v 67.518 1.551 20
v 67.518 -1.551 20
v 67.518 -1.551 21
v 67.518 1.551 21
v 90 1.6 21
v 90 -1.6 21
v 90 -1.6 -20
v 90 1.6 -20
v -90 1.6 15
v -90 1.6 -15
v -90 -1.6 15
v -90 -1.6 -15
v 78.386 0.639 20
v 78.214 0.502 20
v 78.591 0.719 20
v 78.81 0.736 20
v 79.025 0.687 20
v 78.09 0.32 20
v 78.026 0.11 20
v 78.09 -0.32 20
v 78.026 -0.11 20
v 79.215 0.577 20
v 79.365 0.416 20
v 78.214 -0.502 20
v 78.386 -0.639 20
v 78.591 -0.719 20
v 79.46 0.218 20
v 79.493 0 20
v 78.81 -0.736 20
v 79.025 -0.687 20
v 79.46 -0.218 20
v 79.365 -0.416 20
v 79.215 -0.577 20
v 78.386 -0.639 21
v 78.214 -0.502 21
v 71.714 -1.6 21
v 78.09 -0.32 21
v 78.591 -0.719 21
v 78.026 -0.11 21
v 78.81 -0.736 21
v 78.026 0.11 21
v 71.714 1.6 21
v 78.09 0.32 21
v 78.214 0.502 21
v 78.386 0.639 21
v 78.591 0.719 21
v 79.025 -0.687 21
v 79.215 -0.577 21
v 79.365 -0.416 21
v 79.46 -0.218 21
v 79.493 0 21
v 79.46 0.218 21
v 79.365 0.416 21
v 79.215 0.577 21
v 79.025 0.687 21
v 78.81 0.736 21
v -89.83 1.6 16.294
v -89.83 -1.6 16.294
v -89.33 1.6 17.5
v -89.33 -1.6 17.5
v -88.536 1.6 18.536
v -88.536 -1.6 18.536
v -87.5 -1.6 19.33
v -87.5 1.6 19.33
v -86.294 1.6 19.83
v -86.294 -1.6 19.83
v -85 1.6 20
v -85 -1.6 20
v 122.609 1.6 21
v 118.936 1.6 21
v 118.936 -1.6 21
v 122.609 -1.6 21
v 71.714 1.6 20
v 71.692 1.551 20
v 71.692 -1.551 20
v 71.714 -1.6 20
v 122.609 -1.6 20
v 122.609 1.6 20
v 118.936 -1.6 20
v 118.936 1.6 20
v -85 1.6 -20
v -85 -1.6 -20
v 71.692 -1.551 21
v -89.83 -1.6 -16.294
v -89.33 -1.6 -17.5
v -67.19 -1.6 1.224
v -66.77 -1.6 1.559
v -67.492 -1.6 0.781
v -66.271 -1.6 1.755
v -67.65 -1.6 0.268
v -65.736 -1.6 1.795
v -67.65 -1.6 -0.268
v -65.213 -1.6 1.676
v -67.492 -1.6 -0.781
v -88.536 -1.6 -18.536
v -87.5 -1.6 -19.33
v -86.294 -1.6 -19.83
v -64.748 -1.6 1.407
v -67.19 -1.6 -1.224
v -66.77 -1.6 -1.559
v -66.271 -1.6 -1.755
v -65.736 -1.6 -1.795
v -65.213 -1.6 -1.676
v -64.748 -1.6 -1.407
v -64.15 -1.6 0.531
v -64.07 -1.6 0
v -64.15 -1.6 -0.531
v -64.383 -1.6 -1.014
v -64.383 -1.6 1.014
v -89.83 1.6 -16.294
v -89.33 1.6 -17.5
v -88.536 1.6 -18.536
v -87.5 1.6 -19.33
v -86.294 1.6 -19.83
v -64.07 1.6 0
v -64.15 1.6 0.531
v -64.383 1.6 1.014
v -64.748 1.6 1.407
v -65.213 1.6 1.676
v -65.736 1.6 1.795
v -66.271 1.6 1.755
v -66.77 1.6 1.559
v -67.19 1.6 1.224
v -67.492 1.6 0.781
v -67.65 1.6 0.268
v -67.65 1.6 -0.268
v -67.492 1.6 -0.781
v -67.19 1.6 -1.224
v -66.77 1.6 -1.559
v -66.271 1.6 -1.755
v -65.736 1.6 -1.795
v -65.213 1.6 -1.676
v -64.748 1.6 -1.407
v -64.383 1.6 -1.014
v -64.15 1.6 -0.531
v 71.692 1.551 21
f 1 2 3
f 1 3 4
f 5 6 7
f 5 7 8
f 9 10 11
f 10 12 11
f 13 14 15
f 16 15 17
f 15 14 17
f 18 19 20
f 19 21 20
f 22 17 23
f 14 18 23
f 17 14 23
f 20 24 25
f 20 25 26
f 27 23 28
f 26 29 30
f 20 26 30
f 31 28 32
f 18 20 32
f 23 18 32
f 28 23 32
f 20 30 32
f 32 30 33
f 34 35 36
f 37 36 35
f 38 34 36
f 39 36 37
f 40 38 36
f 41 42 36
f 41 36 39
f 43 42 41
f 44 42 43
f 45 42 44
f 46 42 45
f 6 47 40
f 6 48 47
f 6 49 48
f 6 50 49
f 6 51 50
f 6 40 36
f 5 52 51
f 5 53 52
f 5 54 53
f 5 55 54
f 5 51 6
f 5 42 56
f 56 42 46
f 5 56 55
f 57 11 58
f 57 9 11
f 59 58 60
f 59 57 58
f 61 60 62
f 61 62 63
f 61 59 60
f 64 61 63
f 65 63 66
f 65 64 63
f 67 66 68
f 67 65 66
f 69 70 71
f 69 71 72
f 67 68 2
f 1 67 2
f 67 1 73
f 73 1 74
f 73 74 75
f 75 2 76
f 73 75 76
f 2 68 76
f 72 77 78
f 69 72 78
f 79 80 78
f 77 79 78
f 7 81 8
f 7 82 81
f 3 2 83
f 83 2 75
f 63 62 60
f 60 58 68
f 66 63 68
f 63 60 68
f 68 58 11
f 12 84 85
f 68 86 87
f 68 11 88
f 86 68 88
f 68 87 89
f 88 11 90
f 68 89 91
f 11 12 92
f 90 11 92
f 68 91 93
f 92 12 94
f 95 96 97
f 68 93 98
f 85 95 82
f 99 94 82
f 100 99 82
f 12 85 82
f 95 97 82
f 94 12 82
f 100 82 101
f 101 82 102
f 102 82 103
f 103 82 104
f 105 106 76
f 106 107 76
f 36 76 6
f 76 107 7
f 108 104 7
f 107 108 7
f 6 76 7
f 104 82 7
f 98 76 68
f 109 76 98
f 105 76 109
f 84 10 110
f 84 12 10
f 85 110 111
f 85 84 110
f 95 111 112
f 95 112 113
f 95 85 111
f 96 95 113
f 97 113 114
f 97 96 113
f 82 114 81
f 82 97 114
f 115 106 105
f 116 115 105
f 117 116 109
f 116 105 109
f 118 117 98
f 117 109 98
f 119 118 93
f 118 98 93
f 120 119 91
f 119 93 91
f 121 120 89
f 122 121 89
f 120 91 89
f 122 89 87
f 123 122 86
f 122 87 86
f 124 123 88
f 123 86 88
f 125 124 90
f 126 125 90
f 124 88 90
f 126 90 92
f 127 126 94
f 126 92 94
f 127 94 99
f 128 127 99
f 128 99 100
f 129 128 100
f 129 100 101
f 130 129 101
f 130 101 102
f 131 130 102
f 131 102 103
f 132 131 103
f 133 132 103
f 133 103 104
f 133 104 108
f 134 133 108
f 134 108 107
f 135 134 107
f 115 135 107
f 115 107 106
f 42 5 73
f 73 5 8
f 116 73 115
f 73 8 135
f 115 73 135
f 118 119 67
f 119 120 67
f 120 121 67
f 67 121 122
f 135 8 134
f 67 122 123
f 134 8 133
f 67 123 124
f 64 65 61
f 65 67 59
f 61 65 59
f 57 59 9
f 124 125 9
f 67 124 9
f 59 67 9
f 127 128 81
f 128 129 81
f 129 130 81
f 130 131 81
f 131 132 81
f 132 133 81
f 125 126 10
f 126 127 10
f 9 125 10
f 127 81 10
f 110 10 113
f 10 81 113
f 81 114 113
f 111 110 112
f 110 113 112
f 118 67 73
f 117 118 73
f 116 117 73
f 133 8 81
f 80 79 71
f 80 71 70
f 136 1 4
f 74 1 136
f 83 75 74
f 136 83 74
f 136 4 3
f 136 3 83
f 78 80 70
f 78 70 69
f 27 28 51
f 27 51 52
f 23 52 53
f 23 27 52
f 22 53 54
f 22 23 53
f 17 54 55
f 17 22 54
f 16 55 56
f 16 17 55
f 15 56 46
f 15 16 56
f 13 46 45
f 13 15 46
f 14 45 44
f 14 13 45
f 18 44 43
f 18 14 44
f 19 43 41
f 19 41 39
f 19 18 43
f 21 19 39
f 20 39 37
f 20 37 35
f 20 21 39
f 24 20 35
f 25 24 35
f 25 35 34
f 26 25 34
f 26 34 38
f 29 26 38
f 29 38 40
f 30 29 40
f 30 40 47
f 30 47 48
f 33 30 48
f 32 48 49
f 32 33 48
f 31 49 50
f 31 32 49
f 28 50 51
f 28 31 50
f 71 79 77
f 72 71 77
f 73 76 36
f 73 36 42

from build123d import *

# Parameters (mm, degrees)
F0_W      = 180
F0_H      = 40
F1_DEPTH  = 1.6
F2_R      = 5
F3_R      = 1.8
F4_DEPTH  = 4.1
F5_W      = 3.6728084087
F5_H      = 3.2
F6_DEPTH  = 1
F7_W      = 4.2031484842
F7_H      = 3.2
F8_DEPTH  = 1
F10_W     = 4.1738450527
F10_H     = 3.1016289722
F11_DEPTH = 1
F9_W      = 5.8124548197
F9_H      = 3.2
F9_W_2    = 2.8670355678
F9_R      = 0.7379231369
F9_W_3    = 5.4037979245
F12_DEPTH = 1


with BuildPart() as f1:
    # F0 (on Front) → F1 (new body, symmetric)
    with BuildSketch(Plane.XZ):
        Rectangle(F0_W, F0_H)
    extrude(amount=F1_DEPTH, both=True)

    # F2
    f2_edges = [f1.edges().sort_by_distance(p)[0] for p in [
        (-90, 0, 20),
        (-90, 0, -20),
    ]]
    fillet(f2_edges, radius=F2_R)

    # F3 (on face) → F4 (cut)
    with BuildSketch(Plane.XZ.offset(1.6)):
        with Locations((-65.8702030778, 0)):
            Circle(F3_R)
    extrude(amount=-F4_DEPTH, mode=Mode.SUBTRACT)

    # F7 (on face) → F8 (join)
    with BuildSketch(Plane.XY.offset(20)):
        with Locations((87.8984257579, 0)):
            Rectangle(F7_W, F7_H)
    extrude(amount=F8_DEPTH)

    # F10 (on face) → F11 (join)
    with BuildSketch(Plane.XY.offset(20)):
        with Locations((69.6047022939, 0)):
            Rectangle(F10_W, F10_H)
    extrude(amount=F11_DEPTH)

    # F9 (on face) → F12 (join)
    with BuildSketch(Plane.XY.offset(20)):
        with Locations((82.8906241059, 0)):
            Rectangle(F9_W, F9_H)
        with Locations((78.5508789122, 0)):
            Rectangle(F9_W_2, F9_H)
        with Locations((78.7552073598, 0)):
            Circle(F9_R, mode=Mode.SUBTRACT)
        with Locations((74.4154621661, 0)):
            Rectangle(F9_W_3, F9_H)
    extrude(amount=F12_DEPTH)


with BuildPart() as f6:
    # F5 (on face) → F6 (new body)
    with BuildSketch(Plane.XY.offset(20)):
        with Locations((120.7727342844, 0)):
            Rectangle(F5_W, F5_H)
    extrude(amount=F6_DEPTH)


solid = Compound([f1.part, f6.part])
